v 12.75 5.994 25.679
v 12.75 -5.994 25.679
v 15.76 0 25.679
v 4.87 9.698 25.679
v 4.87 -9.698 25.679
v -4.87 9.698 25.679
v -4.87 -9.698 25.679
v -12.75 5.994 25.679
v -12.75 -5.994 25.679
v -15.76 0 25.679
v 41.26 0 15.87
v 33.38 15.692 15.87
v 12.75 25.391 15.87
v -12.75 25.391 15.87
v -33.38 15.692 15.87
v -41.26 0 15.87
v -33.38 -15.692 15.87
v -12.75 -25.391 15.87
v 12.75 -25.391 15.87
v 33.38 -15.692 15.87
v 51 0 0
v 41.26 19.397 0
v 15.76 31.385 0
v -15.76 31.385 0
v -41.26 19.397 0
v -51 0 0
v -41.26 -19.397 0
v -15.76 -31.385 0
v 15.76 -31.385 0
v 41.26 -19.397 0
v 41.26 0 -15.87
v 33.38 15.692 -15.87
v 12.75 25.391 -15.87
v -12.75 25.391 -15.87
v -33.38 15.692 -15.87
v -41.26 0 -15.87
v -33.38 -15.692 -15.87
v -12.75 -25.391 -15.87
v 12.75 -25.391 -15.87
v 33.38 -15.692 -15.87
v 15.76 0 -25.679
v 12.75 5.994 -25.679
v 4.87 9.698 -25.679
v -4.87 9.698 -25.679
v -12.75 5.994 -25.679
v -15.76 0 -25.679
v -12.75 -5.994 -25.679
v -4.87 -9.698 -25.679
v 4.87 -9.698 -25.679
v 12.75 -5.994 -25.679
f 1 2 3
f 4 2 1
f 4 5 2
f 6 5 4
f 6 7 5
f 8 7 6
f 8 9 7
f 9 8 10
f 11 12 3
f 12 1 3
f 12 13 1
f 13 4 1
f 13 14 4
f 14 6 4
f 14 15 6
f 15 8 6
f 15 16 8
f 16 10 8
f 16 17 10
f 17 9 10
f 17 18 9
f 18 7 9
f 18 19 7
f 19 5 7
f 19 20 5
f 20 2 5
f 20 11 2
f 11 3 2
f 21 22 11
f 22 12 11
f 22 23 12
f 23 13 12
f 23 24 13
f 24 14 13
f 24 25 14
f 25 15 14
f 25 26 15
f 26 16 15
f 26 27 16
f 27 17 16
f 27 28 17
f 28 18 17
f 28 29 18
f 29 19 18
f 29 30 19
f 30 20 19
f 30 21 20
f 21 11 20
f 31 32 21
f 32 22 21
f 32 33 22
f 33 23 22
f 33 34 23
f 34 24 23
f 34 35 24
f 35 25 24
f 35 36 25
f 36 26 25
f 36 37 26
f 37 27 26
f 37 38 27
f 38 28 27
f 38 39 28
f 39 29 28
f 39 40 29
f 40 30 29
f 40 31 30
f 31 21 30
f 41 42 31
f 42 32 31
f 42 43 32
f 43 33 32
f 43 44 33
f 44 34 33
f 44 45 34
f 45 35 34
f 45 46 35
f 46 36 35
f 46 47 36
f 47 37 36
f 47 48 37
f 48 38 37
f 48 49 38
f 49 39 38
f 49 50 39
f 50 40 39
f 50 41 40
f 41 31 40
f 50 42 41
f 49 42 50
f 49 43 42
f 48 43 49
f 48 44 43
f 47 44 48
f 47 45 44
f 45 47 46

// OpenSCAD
// Generated by SolidPython 1.0.1 on 2020-07-29 00:46:53


scale(v = [17, 11, 9]) {
	sphere(r = 3);
}
/***********************************************
*********      SolidPython code:      **********
************************************************
 
# import packages: SolidPython
from solid import *
from solid.utils import *
from itertools import chain, combinations, permutations


class Resize:

    def __init__(self, scad_file):
        self.scad_file = scad_file
        #self.scad_file = import_scad(scad_file)
        # cone/cylinder param:
        self.r1 = 0
        self.r2 = 0
        self.h = 0
        # rectangular prism param:
        self.w = 0
        self.l = 0
        # ellipse param:
        self.r = 0

    # import OpenScad code (file name corresponds to shape)


    # classify shape + parameters
    def assign(self, param1, param2, param3):
        if self.scad_file == 'cone.scad':
            self.r1 = param1
            self.r2 = param2
            self.h = param3
        elif self.scad_file == 'cylinder.scad':
            self.r1 = param1
            self.r2 = param2
            self.h = param3
        elif self.scad_file == 'rectangularPrism.scad':
            self.h = param1
            self.l = param2
            self.w = param3
        else:
            self.r = param1
            self.h = param2

    # resize parameters
    def iterate(self):
        x = range(3, 20, 2)
        i = 1
        if self.scad_file == 'cone.scad':
            tempList = list(permutations(x, 2))
            for temp in tempList:
                param1 = temp[0]
                param2 = temp[1]
                filepath = 'produced_scad_files/' + 'cone' + str(param1) + '_' + str(param2) + '_' + '.scad'
                scad_render_to_file(cylinder(h=param1, r1=param2, r2=0), filepath)

        elif self.scad_file == 'cylinder.scad':
            tempList = list(permutations(x, 3))
            for temp in tempList:
                param1 = temp[0]
                param2 = temp[1]
                filepath = 'produced_scad_files/' + 'cylinder' + str(param1) + '_' + str(param2) + '_' + '.scad'
                scad_render_to_file(cylinder(h=param1, r1=param2, r2=param2), filepath)

        elif self.scad_file == 'rectangularPrism.scad':
            tempList = list(permutations(x, 3))
            for temp in tempList:
                param1 = temp[0]
                param2 = temp[1]
                param3 = temp[2]
                filepath = 'produced_scad_files/' + 'rectangularPrism' + str(param1) + '_' + str(param2) + '_' + str(
                    param3) + '.scad'
                scad_render_to_file(cube(size=(param1, param2, param3)), filepath)

        elif self.scad_file == 'ellipse.scad':
            tempList = list(permutations(x, 4))
            for temp in tempList:
                param1 = temp[0]
                param2 = temp[1]
                param3 = temp[2]
                param4 = temp[3]
                filepath = 'produced_scad_files/' + 'ellipse' + str(param1) + '_' + str(param2) + '_' + str(param3) + '_' + str(param4) + '.scad'
                scad_render_to_file(scale([param1, param2, param3])(sphere(r=param4)), filepath)

    def render_to_scadfile(self):
        scad_render_to_file(scad, 'example.scad') 
 
************************************************/
